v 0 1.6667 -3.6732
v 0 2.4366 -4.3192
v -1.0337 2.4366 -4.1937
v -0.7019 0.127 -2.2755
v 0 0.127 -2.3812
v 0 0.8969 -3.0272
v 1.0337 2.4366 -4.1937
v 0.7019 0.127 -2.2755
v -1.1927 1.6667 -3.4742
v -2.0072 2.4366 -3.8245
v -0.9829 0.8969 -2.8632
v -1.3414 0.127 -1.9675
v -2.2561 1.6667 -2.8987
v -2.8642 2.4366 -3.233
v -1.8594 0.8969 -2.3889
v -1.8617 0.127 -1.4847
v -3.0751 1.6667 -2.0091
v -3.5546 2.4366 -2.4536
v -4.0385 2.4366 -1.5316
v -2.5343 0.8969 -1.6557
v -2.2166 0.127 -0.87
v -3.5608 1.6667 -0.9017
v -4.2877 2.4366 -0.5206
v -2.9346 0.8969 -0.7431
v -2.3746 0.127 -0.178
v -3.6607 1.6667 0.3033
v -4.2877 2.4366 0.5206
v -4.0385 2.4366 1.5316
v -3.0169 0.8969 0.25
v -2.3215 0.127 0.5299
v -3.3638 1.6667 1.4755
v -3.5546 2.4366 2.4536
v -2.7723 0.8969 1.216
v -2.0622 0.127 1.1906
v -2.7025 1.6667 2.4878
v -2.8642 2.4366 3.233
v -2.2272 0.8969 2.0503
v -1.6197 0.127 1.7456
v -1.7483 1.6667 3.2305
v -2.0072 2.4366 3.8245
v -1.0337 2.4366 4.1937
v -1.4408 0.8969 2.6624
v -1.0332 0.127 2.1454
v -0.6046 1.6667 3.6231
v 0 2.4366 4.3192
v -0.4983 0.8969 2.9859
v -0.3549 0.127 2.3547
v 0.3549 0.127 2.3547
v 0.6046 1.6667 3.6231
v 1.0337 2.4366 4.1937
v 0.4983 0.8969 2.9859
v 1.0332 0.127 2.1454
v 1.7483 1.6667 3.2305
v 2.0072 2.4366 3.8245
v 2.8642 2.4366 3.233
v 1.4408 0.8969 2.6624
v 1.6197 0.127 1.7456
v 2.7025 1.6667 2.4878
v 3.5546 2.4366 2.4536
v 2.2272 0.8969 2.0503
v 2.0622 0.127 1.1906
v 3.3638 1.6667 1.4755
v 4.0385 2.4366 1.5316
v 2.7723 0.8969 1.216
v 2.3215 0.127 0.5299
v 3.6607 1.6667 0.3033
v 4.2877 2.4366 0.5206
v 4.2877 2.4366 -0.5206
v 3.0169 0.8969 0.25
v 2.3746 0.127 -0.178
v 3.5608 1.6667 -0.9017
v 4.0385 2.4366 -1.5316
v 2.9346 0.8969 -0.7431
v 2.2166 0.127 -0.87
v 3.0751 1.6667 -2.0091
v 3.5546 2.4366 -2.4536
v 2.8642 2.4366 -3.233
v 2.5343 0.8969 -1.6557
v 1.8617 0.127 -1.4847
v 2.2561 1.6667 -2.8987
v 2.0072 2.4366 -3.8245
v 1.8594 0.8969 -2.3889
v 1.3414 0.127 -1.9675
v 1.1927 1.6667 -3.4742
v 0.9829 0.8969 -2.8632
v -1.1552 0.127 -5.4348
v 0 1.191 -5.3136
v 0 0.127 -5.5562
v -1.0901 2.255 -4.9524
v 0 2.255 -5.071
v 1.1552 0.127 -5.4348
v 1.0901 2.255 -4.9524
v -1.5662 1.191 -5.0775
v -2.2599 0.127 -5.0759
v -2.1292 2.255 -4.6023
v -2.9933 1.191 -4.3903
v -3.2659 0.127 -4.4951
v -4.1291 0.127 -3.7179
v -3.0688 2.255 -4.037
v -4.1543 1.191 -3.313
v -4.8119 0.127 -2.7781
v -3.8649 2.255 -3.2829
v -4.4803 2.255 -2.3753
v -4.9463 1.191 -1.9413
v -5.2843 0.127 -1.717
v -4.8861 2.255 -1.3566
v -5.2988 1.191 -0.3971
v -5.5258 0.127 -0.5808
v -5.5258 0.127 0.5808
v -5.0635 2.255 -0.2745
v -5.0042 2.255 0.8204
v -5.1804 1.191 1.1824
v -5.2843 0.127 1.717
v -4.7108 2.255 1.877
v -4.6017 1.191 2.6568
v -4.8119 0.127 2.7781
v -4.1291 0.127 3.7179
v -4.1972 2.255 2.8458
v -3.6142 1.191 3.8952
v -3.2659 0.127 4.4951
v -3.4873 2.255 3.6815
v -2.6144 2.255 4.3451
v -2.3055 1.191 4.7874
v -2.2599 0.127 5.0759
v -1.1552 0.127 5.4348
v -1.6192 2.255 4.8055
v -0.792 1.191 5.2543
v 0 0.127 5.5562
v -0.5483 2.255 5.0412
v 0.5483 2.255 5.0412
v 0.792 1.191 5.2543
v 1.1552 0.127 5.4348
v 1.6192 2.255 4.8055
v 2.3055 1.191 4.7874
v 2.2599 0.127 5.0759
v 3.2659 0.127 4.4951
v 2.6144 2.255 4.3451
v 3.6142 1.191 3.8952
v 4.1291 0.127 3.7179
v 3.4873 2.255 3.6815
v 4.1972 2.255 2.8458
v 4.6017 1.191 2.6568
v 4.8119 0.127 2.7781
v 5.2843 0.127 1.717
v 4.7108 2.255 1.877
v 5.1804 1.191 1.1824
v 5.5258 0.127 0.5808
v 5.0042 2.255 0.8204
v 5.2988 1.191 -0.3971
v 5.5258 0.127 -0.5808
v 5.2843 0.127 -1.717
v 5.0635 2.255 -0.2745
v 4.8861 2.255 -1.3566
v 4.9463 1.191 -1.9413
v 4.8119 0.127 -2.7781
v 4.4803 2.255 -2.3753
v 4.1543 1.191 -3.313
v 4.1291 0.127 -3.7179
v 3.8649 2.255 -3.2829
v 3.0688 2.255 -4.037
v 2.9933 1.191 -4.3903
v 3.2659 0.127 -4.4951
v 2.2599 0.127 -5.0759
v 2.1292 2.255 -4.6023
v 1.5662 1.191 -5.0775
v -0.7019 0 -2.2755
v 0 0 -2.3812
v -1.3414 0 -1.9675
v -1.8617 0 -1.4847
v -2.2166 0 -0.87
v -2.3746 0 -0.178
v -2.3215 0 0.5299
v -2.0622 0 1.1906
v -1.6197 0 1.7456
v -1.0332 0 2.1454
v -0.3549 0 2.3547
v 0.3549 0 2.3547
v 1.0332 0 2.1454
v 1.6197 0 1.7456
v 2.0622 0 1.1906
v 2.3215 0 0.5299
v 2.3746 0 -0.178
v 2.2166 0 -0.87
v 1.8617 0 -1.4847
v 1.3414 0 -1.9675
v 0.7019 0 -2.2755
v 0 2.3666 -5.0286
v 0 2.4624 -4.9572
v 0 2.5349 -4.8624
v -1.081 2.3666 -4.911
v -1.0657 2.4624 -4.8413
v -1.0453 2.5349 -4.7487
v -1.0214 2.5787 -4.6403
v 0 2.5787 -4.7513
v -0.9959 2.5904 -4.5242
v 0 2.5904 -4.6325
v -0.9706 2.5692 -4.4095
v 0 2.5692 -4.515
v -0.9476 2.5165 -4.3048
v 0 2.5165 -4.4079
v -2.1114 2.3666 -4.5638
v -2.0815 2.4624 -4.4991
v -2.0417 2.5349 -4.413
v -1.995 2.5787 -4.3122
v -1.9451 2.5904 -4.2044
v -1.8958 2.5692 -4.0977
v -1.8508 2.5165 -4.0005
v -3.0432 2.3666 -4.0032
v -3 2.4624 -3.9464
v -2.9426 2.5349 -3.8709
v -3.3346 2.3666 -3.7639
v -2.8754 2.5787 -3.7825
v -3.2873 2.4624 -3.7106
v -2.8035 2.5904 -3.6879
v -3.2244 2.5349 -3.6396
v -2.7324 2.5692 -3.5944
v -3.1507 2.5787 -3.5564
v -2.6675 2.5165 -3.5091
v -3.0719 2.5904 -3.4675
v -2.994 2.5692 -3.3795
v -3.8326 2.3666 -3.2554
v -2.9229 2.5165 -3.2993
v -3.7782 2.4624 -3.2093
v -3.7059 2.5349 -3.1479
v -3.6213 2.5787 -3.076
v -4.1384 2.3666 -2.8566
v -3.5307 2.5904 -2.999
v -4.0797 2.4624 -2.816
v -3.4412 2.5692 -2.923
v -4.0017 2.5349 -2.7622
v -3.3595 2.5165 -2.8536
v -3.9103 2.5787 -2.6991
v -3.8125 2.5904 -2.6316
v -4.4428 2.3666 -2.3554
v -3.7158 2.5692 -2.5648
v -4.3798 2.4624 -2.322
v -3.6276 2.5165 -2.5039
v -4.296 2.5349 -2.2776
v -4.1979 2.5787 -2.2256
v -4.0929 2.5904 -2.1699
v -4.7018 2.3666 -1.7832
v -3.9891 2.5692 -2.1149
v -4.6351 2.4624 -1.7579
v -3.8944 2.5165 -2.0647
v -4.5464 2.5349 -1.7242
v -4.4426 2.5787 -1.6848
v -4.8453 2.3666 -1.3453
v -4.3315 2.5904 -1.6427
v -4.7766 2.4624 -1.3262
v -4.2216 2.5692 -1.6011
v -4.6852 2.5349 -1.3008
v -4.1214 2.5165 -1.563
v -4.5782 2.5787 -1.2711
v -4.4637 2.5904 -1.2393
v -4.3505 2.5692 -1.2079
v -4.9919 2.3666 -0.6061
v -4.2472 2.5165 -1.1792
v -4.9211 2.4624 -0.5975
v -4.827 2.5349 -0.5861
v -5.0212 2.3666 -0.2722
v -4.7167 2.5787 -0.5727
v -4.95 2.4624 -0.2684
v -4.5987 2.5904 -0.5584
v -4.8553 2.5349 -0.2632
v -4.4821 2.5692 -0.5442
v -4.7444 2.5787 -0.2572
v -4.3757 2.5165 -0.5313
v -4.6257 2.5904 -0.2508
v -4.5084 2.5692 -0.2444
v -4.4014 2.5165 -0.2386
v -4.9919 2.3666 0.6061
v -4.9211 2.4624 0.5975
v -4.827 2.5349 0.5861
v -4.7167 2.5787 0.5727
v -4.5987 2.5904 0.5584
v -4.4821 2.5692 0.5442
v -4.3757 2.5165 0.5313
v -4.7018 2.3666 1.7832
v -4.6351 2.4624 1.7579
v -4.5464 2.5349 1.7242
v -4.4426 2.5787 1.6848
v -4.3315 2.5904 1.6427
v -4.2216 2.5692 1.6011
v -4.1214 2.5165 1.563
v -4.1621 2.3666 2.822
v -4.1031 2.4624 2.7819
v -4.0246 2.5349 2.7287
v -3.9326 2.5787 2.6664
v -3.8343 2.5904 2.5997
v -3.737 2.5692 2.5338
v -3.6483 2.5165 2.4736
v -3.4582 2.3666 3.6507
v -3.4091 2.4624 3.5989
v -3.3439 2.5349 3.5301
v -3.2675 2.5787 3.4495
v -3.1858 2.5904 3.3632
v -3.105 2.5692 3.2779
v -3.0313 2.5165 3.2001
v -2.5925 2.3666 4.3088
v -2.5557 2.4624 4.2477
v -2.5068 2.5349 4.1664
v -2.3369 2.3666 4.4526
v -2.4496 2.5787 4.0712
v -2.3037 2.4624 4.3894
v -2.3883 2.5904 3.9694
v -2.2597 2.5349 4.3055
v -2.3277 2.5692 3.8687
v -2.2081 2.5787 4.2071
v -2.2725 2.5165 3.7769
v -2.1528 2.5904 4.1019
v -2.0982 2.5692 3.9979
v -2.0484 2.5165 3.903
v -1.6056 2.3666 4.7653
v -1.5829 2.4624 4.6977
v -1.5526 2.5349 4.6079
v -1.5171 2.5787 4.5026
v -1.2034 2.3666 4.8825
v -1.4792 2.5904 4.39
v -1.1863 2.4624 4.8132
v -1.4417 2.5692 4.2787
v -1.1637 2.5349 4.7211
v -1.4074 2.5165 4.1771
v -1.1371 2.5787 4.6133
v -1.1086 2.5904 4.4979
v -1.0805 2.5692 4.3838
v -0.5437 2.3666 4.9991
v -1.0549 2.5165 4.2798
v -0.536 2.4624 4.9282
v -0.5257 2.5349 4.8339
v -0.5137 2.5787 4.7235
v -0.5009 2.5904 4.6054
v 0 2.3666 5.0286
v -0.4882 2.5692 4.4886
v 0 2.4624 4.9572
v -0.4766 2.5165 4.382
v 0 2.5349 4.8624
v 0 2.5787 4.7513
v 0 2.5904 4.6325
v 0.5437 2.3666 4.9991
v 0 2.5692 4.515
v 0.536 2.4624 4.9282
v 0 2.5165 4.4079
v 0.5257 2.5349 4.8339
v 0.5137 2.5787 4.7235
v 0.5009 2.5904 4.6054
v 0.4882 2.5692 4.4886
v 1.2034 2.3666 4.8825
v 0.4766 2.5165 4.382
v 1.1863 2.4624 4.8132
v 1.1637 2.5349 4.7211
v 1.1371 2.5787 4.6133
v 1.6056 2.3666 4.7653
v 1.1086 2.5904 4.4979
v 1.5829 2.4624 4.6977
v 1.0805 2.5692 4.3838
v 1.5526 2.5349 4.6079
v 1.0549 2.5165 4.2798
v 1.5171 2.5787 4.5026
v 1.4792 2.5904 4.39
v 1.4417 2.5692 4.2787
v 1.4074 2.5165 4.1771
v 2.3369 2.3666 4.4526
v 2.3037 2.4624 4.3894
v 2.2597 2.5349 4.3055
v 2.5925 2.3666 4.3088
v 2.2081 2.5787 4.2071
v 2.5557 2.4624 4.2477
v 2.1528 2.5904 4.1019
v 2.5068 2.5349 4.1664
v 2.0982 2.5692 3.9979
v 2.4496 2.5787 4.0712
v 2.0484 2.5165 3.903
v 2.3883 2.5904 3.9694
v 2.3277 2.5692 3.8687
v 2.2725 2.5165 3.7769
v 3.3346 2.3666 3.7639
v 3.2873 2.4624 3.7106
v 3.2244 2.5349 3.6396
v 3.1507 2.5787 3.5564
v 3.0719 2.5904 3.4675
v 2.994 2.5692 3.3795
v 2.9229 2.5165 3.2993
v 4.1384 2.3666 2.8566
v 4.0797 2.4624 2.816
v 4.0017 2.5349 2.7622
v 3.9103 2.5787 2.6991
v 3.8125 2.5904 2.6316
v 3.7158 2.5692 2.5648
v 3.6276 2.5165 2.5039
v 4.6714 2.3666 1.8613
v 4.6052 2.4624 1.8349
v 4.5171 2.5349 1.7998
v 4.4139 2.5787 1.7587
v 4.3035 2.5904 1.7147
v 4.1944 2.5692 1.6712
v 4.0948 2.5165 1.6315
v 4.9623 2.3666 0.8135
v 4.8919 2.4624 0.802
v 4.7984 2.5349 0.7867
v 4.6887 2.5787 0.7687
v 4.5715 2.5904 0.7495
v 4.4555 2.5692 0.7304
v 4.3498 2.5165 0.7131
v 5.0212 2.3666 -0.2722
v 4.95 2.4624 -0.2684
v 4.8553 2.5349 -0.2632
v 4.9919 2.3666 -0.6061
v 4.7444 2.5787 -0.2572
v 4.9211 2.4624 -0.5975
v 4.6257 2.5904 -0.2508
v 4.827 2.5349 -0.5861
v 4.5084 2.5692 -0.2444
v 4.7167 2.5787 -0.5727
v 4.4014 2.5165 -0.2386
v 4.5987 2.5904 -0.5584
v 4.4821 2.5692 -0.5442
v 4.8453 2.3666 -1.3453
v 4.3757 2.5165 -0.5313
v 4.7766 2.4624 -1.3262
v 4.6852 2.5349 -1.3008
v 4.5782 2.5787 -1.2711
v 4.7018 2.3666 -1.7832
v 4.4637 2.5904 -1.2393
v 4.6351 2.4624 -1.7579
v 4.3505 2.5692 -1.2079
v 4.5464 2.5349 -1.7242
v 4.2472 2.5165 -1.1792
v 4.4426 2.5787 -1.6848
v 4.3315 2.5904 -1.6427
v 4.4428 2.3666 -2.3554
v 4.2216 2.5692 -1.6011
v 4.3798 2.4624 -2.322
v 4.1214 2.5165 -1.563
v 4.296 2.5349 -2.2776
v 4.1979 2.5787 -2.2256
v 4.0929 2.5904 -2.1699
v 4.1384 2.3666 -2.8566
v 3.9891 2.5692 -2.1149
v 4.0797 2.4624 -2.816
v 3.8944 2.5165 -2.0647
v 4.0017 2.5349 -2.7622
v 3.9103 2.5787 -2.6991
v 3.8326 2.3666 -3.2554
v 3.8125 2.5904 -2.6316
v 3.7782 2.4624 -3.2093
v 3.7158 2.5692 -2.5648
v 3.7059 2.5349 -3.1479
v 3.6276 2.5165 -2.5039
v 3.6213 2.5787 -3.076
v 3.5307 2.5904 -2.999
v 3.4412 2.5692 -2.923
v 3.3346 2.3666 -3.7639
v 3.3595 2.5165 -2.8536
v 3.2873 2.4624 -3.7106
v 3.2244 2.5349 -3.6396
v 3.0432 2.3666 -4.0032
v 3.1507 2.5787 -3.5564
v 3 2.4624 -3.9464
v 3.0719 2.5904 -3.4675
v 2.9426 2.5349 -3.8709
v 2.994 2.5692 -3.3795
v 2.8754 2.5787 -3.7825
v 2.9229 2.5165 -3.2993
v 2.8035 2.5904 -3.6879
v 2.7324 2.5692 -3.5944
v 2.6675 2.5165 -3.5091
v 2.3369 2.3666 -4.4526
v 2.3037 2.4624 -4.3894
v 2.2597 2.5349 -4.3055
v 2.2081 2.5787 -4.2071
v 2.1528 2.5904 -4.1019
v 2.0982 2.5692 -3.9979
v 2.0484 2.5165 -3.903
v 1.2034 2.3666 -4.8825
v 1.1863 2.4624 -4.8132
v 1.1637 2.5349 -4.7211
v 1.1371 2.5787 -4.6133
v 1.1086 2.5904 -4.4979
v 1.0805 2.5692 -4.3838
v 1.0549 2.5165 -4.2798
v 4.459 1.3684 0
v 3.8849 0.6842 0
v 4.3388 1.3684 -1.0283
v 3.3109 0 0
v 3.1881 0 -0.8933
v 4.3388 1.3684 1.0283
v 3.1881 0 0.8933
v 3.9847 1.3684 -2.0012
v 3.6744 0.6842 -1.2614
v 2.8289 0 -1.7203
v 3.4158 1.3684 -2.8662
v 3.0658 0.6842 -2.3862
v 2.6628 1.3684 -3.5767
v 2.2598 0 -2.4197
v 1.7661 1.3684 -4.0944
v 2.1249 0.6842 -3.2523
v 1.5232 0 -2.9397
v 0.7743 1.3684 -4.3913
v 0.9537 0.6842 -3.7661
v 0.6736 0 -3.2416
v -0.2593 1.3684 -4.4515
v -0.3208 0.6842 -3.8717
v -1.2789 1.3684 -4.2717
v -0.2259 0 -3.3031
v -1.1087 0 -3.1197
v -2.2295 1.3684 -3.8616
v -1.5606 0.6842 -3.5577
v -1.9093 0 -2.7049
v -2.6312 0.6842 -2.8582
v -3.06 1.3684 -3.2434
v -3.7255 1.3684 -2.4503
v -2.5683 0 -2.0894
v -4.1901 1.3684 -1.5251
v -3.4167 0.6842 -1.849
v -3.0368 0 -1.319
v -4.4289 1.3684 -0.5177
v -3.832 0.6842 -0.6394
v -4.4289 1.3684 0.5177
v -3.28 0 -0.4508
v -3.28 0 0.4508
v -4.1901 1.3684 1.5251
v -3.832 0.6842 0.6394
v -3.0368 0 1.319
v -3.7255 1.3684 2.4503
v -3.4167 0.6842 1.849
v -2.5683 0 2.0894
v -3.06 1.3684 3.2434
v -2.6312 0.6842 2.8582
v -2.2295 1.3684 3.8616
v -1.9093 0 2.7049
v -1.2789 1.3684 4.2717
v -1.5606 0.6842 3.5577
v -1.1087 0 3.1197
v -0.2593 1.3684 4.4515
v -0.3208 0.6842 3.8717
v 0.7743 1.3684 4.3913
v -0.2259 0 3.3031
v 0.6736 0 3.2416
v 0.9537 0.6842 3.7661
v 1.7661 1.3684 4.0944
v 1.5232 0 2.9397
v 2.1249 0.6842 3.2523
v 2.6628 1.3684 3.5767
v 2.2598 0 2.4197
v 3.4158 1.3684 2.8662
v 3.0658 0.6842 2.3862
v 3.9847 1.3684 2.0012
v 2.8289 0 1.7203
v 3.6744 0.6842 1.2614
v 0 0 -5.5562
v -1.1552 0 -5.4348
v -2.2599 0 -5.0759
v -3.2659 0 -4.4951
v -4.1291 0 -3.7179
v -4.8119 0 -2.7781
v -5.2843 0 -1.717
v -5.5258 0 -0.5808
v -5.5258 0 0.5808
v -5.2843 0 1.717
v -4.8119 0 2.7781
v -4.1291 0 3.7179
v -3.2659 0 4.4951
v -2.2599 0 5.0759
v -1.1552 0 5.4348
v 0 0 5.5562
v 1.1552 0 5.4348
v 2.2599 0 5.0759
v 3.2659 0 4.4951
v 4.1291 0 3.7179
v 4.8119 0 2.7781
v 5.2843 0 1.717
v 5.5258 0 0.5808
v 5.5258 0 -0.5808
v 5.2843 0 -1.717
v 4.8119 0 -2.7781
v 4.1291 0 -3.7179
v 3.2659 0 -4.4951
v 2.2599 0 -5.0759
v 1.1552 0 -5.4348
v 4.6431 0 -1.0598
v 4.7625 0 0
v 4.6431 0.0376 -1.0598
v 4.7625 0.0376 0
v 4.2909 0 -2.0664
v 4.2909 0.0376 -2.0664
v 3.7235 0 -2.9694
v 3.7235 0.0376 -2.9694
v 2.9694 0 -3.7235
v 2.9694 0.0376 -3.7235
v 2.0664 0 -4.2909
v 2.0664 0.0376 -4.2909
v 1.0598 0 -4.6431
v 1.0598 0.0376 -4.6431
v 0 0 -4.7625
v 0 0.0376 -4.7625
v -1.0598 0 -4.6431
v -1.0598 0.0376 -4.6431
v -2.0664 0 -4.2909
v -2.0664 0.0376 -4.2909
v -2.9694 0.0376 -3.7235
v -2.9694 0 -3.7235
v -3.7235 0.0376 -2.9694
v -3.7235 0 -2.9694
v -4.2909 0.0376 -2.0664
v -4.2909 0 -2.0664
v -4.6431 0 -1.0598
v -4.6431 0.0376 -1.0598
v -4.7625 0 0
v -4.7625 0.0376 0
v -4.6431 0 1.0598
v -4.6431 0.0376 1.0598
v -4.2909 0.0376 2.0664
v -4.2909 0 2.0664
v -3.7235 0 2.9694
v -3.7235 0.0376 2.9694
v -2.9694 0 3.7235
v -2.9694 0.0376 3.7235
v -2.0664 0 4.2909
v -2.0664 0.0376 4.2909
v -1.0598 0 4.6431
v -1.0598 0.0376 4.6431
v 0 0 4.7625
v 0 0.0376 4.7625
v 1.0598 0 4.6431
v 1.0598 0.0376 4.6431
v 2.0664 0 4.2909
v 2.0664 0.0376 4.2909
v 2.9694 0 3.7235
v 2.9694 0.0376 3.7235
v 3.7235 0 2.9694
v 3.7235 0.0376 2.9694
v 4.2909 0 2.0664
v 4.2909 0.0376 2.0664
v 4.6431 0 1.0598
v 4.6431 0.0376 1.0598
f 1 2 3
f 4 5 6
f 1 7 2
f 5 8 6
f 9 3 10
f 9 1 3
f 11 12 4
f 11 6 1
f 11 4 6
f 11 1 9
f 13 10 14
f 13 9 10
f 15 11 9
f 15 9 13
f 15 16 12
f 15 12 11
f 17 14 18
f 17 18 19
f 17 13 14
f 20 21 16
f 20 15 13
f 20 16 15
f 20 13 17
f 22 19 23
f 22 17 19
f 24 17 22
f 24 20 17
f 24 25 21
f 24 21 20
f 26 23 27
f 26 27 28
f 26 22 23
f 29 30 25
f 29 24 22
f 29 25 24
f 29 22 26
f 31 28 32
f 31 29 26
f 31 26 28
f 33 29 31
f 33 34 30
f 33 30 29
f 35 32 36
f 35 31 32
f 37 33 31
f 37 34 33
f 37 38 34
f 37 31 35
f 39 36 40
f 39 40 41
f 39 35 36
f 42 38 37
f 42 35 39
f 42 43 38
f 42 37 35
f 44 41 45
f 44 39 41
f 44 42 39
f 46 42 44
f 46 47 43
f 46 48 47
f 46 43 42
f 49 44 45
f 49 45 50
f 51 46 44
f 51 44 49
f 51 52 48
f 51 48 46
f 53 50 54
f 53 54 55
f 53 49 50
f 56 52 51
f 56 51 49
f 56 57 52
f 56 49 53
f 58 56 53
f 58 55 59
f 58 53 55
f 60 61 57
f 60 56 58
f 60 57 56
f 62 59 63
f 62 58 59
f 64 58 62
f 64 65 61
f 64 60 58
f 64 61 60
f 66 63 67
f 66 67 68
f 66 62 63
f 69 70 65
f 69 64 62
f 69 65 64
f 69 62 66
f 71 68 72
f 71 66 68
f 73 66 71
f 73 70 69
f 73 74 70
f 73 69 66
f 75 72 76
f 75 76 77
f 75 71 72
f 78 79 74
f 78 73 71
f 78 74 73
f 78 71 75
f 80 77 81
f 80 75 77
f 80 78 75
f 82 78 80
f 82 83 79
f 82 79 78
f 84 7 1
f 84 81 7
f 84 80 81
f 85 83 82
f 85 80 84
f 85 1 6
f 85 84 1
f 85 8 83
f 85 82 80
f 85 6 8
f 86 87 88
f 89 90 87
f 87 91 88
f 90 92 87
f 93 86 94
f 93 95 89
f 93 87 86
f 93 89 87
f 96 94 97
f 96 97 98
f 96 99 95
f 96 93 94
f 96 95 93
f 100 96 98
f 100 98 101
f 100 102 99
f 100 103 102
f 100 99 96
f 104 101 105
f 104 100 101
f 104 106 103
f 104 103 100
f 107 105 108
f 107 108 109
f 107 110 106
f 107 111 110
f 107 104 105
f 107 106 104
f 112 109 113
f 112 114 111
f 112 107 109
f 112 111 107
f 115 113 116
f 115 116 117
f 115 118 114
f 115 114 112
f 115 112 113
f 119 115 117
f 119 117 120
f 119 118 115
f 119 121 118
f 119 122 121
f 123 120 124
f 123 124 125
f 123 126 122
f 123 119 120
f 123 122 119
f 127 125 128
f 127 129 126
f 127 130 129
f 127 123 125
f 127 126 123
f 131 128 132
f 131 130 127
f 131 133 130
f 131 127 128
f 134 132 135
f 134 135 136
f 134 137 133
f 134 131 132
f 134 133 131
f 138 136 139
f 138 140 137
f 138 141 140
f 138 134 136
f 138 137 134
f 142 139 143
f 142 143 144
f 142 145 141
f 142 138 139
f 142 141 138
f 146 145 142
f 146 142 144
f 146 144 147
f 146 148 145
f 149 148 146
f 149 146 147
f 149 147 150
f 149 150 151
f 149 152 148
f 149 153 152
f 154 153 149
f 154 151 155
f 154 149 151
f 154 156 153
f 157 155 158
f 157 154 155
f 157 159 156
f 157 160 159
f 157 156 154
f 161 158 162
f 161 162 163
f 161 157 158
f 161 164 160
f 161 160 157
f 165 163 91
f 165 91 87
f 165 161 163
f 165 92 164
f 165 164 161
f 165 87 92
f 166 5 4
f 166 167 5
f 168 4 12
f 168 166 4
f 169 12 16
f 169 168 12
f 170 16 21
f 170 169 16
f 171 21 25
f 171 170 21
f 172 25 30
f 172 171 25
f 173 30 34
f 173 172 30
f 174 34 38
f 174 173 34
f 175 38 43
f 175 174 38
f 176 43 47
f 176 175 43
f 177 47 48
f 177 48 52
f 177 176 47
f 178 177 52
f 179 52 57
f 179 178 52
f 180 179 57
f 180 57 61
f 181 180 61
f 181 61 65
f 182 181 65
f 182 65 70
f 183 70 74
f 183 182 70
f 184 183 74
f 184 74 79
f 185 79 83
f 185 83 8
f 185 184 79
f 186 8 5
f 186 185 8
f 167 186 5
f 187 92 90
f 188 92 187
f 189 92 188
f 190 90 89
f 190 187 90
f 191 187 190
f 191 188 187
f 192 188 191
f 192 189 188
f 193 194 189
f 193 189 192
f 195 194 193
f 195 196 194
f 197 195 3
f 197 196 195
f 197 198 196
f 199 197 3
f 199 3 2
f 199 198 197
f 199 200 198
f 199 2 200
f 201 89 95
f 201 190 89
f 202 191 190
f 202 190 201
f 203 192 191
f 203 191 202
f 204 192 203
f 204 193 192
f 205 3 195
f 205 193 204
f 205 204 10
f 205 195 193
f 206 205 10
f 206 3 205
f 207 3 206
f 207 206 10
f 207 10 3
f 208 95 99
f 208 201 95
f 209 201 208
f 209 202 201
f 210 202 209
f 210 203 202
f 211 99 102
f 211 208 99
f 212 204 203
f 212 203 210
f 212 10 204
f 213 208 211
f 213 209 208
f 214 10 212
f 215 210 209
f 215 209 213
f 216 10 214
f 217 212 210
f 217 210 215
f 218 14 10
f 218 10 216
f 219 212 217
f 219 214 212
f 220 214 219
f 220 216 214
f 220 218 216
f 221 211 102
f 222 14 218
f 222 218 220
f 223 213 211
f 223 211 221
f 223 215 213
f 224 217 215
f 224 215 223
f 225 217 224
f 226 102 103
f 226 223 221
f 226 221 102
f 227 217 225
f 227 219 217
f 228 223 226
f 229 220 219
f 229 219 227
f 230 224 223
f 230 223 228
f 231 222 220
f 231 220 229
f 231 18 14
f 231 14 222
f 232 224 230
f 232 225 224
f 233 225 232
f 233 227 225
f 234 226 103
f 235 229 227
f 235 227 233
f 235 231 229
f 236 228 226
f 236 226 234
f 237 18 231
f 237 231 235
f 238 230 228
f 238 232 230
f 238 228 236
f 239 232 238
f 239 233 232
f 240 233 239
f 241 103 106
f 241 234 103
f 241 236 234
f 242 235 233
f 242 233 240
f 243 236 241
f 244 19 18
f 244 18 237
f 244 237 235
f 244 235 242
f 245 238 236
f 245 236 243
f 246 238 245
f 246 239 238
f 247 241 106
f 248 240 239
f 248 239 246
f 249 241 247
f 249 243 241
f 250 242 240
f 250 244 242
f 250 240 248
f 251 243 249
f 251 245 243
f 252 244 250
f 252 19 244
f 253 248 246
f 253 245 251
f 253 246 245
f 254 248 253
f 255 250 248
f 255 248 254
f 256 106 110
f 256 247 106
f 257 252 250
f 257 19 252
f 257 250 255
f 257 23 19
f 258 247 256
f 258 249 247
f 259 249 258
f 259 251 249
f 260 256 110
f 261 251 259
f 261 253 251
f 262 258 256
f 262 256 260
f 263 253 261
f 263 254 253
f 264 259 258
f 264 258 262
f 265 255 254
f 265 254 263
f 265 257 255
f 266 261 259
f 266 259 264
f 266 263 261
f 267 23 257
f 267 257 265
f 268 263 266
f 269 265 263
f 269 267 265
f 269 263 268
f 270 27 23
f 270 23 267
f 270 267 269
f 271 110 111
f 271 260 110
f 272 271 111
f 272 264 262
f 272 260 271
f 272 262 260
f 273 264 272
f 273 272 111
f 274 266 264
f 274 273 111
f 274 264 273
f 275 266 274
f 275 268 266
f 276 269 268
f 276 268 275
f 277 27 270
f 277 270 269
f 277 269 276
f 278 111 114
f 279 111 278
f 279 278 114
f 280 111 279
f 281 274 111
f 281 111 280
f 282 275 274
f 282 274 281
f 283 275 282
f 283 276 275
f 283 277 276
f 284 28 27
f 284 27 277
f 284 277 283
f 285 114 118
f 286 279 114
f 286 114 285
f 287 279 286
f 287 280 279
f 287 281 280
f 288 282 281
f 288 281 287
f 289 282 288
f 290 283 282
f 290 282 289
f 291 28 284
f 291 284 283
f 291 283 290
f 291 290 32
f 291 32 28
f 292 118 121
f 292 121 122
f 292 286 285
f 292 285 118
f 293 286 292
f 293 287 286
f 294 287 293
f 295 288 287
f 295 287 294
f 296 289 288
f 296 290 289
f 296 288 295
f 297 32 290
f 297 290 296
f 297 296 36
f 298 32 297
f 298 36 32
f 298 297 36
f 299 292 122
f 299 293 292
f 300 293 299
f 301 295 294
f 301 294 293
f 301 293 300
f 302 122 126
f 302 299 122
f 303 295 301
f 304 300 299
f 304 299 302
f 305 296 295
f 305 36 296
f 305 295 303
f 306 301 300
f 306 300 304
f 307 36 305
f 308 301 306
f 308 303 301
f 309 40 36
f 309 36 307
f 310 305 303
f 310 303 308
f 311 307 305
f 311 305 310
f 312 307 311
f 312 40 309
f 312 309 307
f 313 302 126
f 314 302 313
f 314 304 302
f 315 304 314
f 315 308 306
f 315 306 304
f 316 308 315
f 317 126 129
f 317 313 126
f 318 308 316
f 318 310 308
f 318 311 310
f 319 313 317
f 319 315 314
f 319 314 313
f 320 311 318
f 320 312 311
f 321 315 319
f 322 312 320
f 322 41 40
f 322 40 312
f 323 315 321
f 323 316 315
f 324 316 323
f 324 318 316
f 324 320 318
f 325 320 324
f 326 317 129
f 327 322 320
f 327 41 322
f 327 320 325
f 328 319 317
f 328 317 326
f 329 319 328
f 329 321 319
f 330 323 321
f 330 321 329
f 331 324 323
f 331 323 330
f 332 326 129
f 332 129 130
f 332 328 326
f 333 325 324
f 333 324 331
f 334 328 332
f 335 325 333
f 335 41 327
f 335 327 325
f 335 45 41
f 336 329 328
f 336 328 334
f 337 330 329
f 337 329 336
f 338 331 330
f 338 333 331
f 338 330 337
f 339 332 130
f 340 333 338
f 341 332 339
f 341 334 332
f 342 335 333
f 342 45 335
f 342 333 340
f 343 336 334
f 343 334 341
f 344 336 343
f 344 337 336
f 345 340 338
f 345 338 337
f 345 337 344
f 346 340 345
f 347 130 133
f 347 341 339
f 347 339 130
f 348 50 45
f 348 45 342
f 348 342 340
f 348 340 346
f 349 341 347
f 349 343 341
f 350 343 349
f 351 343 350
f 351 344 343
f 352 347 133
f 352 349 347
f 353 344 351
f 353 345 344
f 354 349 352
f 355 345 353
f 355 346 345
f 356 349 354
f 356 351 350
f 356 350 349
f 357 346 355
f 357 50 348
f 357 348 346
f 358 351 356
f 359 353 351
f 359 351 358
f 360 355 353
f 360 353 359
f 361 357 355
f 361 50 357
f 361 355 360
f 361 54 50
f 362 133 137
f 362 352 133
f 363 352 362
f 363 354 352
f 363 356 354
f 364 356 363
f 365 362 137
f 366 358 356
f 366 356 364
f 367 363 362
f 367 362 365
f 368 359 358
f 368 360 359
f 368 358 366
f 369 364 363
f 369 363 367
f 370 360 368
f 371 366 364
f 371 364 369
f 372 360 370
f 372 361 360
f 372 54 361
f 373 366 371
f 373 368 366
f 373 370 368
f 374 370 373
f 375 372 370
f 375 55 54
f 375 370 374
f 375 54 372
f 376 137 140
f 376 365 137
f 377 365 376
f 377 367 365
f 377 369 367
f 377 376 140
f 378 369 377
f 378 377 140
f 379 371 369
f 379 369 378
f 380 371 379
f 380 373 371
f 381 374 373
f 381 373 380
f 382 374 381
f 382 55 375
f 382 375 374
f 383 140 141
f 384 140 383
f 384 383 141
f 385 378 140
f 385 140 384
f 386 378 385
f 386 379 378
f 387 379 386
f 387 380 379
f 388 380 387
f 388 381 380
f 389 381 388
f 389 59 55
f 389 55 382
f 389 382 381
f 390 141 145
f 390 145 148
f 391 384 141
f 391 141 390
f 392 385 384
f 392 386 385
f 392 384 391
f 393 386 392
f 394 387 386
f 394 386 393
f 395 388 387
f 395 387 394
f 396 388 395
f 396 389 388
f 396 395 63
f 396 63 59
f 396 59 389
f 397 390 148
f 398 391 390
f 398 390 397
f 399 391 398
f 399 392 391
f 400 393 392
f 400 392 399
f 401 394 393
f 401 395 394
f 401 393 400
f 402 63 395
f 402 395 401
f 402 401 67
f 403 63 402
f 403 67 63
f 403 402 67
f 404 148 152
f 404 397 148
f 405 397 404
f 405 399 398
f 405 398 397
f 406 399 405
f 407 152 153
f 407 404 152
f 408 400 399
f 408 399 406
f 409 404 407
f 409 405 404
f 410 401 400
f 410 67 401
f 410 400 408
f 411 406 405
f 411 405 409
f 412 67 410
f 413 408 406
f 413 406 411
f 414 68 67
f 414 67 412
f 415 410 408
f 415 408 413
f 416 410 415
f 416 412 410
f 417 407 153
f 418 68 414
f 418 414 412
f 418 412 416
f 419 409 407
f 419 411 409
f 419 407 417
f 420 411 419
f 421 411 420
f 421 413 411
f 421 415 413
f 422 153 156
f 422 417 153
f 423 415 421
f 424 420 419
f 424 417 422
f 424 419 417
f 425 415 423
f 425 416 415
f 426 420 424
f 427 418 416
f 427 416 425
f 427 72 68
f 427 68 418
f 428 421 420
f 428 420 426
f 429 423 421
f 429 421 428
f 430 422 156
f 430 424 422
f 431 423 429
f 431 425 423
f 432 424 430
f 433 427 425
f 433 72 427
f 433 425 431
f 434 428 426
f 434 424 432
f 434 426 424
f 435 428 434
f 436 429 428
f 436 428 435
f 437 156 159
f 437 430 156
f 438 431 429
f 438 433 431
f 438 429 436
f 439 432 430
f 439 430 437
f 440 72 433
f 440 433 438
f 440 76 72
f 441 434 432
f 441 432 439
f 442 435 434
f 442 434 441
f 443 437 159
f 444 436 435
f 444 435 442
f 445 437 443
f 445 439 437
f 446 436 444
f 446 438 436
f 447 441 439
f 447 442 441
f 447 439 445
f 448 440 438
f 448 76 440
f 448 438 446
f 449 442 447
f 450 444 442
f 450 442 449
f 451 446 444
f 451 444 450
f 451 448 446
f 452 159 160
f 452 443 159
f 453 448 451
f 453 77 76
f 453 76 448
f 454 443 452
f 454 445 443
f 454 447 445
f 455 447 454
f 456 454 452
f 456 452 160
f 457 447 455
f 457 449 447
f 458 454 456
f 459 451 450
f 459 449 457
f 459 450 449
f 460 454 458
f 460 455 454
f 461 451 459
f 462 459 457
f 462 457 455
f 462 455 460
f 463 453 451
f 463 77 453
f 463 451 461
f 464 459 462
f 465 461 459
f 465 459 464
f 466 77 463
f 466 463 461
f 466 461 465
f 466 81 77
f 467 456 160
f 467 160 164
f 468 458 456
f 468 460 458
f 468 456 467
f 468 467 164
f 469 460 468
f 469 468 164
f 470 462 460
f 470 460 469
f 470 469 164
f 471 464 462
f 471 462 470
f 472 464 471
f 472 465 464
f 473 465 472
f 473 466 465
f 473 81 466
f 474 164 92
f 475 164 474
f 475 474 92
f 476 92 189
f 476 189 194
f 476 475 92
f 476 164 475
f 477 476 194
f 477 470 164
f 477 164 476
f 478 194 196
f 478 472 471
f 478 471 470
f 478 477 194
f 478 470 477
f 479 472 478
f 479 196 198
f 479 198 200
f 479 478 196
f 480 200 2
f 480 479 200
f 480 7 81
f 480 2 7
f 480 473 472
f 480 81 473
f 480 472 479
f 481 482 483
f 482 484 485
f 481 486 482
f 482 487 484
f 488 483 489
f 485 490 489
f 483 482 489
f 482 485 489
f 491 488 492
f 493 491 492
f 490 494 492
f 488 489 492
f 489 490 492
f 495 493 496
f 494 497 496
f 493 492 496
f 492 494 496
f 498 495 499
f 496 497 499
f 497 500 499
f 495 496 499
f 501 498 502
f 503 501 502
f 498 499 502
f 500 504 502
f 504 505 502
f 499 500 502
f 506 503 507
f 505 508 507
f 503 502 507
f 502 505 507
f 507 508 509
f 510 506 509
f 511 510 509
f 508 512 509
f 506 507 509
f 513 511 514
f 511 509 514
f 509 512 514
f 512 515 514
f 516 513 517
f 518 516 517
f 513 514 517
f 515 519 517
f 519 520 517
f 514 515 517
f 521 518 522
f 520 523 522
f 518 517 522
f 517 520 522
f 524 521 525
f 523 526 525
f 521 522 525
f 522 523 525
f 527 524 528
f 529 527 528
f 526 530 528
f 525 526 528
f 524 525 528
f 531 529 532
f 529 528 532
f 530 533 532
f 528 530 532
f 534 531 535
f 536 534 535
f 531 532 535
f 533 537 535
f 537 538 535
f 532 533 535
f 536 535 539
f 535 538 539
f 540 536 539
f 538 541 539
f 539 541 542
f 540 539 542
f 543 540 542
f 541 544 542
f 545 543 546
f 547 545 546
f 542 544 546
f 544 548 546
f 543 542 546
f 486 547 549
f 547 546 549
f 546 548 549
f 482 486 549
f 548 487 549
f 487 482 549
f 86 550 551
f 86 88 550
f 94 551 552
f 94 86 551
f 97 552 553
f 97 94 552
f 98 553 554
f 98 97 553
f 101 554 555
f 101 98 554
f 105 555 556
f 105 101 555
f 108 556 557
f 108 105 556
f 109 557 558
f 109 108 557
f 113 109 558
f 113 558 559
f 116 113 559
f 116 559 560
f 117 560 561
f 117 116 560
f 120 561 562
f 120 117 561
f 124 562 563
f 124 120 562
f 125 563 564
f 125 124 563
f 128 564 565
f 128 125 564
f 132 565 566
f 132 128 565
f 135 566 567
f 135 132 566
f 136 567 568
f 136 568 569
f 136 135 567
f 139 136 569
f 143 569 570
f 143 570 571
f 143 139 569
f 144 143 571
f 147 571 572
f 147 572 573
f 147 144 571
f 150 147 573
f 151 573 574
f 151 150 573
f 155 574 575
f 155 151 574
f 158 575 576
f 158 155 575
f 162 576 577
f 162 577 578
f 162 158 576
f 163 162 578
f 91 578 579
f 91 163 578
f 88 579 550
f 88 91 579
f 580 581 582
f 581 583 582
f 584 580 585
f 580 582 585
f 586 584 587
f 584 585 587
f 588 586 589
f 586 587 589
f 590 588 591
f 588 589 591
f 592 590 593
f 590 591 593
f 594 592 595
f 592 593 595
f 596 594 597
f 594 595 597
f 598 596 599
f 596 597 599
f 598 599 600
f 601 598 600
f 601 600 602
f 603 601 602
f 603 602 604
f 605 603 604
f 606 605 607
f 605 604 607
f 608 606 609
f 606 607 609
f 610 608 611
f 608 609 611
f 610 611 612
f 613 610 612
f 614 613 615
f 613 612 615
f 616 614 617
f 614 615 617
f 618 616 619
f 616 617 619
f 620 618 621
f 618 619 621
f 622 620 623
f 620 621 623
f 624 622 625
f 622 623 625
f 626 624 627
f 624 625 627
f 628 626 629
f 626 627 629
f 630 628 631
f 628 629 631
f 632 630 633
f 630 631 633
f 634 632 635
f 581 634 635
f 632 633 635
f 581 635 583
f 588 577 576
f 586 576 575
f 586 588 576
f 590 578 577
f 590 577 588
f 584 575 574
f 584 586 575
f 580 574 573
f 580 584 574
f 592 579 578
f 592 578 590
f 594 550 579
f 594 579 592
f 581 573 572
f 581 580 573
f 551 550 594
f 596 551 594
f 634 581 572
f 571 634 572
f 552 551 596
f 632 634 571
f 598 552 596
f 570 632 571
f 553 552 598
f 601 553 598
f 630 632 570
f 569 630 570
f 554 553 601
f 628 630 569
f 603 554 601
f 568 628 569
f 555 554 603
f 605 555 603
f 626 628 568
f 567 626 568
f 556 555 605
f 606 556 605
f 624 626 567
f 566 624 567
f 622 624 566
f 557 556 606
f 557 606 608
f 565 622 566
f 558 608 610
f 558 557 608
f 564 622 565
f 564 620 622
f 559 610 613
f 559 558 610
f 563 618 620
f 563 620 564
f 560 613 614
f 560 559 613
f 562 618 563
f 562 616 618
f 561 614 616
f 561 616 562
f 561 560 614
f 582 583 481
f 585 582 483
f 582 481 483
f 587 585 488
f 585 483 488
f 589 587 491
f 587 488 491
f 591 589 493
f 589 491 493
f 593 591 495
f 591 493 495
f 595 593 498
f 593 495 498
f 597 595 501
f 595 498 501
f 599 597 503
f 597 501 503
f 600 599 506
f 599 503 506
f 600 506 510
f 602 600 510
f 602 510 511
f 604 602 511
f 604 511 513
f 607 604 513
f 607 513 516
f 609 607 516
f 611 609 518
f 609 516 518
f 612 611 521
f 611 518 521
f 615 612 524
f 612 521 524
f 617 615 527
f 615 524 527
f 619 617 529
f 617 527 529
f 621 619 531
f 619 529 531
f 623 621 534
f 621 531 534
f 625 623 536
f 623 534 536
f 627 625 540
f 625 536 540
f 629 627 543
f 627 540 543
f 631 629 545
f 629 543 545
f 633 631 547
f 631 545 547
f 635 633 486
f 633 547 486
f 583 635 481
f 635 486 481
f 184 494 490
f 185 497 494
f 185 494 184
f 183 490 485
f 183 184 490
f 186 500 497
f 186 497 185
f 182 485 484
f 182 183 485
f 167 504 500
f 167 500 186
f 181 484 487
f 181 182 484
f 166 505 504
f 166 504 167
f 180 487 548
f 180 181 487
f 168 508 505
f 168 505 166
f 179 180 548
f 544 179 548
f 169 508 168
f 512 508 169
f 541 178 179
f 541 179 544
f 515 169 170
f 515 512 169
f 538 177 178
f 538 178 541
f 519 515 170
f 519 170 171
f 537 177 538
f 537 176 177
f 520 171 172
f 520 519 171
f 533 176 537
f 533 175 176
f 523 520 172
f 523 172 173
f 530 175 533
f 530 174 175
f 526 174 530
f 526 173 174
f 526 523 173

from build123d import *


# Read off the part's stored shape, not the designer's step: Shell2
with BuildPart() as part:
    # Sketch1 → Revolve1 (revolve)
    with BuildSketch(Plane.XY, mode=Mode.PRIVATE) as revolve1_sk:
        with BuildLine():
            Line((-5.55625, 0), (-5.55625, 0.127))
            Line((-5.55625, 0.127), (-5.070967234, 2.25500545))
            ThreePointArc((-5.070967234, 2.25500545), (-4.751339811, 2.57873382), (-4.319197328, 2.43655569))
            Line((-4.319197328, 2.43655569), (-2.38125, 0.127))
            Line((-2.38125, 0.127), (-2.38125, 0))
            Line((-2.38125, 0), (-5.55625, 0))
        make_face()
    revolve(revolve1_sk.sketch.rotate(Axis((0, 0, 0), (0, 1, 0)), 270), axis=Axis((0, 0, 0), (0, 1, 0)))

    # Shell2 outline → Shell2 (revolve, cut)
    with BuildSketch(Plane.XY):
        Polygon((4.459036573, 1.368353826), (3.310851383, 0), (4.7625, 0), (4.7625, 0.03764136), align=None)
    revolve(axis=Axis((0, 0, 0), (0, 1, 0)), mode=Mode.SUBTRACT)


solid = part.part
